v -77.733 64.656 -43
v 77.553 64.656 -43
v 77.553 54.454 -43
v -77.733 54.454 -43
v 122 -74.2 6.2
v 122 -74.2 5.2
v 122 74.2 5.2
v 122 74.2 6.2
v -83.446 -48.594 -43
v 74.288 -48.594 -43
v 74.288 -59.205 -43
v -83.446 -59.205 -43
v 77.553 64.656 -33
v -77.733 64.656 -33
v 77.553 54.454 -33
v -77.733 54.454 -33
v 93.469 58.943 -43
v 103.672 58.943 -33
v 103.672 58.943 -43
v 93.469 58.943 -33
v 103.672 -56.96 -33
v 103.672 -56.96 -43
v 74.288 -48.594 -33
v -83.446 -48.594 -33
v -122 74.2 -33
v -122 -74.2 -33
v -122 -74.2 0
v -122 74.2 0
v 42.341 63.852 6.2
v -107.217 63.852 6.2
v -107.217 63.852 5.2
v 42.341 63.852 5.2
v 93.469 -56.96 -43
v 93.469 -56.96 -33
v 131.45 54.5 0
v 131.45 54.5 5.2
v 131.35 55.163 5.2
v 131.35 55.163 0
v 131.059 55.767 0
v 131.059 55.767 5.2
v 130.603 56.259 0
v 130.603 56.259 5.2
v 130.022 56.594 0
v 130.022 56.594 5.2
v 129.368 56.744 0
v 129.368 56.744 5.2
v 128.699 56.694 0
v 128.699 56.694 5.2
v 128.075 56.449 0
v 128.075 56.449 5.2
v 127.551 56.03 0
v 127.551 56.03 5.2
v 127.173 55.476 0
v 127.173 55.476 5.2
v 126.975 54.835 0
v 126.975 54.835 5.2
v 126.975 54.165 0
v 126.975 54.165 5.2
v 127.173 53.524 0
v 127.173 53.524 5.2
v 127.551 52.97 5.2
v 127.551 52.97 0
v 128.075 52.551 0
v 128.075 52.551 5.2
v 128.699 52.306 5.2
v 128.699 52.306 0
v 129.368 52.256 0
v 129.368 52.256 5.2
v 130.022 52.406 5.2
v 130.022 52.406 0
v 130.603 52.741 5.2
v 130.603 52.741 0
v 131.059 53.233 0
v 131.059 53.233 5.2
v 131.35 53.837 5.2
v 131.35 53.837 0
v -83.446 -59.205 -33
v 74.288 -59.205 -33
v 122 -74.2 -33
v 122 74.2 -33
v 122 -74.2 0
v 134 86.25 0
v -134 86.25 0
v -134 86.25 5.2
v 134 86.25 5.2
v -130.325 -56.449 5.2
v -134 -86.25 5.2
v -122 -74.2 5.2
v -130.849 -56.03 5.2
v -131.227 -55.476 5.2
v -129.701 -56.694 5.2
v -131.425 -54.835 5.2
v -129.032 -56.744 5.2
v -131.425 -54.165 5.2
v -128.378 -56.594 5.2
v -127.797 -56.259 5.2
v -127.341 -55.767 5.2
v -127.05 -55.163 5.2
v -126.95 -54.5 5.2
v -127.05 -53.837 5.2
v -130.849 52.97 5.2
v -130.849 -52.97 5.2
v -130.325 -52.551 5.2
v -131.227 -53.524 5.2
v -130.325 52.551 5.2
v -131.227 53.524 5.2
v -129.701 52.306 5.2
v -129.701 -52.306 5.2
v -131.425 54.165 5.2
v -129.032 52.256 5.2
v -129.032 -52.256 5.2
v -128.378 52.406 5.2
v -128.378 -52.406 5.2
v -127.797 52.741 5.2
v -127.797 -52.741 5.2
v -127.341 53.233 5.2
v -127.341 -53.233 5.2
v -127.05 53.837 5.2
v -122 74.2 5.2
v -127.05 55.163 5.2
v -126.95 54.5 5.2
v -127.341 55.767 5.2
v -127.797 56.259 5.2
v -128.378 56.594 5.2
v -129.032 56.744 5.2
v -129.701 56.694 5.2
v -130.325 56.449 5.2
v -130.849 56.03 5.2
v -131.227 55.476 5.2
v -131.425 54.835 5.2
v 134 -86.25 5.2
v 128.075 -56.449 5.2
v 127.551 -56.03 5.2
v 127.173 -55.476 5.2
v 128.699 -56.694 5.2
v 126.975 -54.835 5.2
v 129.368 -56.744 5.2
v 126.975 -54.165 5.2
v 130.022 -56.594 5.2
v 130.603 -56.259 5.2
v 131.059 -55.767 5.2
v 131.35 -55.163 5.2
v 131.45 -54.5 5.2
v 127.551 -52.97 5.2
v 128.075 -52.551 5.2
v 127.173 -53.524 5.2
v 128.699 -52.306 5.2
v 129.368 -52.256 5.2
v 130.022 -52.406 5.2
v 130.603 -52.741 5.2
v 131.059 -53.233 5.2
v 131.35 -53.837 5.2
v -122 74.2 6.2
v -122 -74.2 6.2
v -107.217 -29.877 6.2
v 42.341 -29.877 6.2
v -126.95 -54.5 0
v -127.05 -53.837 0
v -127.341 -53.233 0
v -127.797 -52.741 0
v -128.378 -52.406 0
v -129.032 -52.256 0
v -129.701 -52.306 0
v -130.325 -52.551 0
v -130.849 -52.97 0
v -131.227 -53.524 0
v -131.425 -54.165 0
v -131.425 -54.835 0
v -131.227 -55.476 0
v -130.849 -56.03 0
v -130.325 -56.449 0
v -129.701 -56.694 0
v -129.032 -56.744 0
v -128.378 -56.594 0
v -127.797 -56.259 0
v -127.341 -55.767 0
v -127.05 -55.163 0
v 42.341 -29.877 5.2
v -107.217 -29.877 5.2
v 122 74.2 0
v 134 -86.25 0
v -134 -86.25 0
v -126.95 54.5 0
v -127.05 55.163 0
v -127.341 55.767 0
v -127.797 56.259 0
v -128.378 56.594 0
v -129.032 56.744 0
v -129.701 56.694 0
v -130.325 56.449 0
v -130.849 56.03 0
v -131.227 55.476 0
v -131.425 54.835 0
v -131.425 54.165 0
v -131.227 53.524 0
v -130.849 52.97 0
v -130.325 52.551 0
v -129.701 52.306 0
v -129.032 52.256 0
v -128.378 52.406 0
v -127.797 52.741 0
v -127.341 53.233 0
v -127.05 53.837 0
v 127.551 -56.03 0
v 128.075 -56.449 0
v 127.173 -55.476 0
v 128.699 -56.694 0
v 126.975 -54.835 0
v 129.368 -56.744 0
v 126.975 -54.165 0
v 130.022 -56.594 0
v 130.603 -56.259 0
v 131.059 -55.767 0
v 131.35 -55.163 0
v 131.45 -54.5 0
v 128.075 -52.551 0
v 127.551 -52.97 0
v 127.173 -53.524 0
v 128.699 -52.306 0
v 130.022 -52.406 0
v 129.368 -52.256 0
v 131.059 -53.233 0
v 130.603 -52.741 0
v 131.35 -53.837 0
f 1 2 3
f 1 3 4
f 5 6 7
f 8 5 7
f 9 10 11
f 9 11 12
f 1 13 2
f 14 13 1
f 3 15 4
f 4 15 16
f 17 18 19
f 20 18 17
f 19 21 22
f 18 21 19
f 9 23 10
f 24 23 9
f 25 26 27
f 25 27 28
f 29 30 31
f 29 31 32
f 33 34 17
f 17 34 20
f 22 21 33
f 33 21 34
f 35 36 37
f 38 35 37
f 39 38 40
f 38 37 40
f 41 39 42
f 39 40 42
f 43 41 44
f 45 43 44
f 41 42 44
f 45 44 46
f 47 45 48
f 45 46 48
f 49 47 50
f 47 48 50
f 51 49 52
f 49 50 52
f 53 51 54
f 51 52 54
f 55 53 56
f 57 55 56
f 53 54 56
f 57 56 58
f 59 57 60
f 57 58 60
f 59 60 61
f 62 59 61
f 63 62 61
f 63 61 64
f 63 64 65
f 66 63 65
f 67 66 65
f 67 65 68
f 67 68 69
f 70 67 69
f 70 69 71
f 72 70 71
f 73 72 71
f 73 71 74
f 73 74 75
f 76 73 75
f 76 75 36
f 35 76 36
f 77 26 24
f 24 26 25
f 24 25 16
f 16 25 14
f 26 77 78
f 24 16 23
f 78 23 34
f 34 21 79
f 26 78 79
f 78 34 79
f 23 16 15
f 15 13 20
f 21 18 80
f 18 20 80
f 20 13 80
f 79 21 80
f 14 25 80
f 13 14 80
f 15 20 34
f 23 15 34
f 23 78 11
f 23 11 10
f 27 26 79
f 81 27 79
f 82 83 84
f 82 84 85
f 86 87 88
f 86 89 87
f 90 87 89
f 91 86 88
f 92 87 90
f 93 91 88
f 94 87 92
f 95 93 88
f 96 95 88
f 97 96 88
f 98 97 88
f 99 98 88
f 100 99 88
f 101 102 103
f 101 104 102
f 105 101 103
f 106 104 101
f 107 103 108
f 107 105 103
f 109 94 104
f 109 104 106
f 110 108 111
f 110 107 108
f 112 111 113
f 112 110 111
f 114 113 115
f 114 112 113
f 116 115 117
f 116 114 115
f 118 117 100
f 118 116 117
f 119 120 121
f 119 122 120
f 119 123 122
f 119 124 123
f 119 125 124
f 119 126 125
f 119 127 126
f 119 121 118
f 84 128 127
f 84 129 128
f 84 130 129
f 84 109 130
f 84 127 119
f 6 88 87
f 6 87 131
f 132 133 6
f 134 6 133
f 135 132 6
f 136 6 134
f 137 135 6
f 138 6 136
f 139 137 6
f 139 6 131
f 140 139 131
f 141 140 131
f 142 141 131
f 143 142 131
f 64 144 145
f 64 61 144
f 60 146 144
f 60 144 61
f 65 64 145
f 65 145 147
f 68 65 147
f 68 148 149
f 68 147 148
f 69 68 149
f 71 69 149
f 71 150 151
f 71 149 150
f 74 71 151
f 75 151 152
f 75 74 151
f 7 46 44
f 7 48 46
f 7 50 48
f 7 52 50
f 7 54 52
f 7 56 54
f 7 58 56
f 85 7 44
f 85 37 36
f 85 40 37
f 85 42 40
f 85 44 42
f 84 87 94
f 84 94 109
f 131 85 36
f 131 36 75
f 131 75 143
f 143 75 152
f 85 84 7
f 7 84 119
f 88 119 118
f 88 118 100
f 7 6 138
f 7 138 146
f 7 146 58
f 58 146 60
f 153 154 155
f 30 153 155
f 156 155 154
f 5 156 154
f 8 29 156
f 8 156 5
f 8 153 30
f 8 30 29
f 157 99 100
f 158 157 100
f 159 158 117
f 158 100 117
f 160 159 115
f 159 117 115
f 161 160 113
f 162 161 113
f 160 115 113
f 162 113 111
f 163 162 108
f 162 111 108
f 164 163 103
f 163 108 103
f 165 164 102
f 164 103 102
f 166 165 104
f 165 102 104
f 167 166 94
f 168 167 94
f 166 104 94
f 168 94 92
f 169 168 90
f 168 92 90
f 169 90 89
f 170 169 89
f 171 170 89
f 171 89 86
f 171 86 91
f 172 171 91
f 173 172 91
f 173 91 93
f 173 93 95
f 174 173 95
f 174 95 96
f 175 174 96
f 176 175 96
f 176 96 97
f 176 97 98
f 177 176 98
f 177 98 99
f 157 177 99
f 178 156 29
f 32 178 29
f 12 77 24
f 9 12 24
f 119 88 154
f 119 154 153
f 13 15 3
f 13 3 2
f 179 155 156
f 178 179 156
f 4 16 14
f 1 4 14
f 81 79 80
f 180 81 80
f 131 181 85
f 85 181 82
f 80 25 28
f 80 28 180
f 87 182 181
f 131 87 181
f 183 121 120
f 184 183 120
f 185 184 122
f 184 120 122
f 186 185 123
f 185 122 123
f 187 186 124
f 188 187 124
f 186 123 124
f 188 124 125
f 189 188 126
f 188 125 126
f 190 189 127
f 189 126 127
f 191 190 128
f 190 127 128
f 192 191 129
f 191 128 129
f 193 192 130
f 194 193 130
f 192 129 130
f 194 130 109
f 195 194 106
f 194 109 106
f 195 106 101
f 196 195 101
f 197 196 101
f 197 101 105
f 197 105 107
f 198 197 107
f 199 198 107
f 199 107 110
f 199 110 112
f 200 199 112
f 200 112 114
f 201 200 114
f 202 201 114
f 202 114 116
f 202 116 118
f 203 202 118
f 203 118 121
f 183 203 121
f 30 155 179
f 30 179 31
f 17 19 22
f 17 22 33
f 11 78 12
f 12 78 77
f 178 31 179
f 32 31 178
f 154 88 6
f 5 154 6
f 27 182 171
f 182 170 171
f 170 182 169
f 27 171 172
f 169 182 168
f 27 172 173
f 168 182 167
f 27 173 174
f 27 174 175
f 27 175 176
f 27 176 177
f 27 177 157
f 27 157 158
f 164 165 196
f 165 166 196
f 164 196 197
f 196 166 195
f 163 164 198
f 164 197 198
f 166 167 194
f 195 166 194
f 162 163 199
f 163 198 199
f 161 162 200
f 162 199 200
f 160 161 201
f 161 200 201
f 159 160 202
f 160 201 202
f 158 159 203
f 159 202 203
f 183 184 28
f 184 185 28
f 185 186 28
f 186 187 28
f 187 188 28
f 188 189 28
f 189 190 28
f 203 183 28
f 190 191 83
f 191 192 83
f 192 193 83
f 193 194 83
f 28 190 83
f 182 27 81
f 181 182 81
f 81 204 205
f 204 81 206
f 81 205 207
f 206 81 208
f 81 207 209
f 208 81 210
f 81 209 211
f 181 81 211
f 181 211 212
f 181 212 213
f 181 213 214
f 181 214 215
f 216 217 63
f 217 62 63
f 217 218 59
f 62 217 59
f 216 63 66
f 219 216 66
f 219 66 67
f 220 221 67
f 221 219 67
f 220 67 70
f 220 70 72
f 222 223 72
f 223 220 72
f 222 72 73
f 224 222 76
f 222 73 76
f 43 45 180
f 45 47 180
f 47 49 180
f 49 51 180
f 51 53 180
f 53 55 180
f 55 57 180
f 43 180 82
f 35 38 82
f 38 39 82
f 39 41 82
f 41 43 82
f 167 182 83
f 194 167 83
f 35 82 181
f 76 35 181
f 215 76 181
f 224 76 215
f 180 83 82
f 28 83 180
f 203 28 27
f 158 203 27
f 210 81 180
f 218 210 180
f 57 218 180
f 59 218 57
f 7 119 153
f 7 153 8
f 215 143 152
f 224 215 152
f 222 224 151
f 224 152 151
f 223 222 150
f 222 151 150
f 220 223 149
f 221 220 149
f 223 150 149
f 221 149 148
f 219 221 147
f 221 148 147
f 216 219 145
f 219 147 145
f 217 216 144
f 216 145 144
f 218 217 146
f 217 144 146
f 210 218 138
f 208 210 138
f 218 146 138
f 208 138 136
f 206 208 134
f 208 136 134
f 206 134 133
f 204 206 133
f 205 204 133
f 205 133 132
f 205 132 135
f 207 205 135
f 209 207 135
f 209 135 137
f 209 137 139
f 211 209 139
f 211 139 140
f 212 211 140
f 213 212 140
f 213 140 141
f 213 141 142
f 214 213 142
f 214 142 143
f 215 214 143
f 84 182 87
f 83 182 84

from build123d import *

# Parameters (mm, degrees)
SKETCH2_W                = 268
SKETCH2_H                = 172.5
BOSS_EXTRUDE2_DEPTH      = 5.2
BOSS_EXTRUDE1_DEPTH      = 6.2
BOSS_EXTRUDE1_DEPTH_BACK = 33
SKETCH1_W                = 244
SKETCH1_H                = 148.4
M4_CLEARANCE_HOLE1_D     = 4.5
SKETCH6_W                = 149.557953786
SKETCH6_H                = 93.729813504
CUT_EXTRUDE1_DEPTH       = 1
SKETCH7_W                = 10.202720683
SKETCH7_H                = 115.902906959
SKETCH7_W_2              = 155.285408795
SKETCH7_H_2              = 10.202720683
SKETCH7_W_3              = 157.734061759
SKETCH7_H_3              = 10.61082951
BOSS_EXTRUDE3_DEPTH      = 10


with BuildPart() as part:
    # Sketch2 → Boss-Extrude2 (new body)
    with BuildSketch(Plane.XY):
        Rectangle(SKETCH2_W, SKETCH2_H)
    extrude(amount=BOSS_EXTRUDE2_DEPTH)

    # Sketch1 → Boss-Extrude1 (add, two sides: drawn at the far end of the back side and taken through both)
    with BuildSketch(Plane.XY.offset(-BOSS_EXTRUDE1_DEPTH_BACK)):
        Rectangle(SKETCH1_W, SKETCH1_H)
    extrude(amount=BOSS_EXTRUDE1_DEPTH + BOSS_EXTRUDE1_DEPTH_BACK)

    # M4 Clearance Hole1 (through all)
    with Locations(Plane(origin=(0, 0, 0), x_dir=(-1, 0, 0), z_dir=(0, 0, -1))):
        with Locations((-129.2, 54.5), (129.2, -54.5), (129.2, 54.5), (-129.2, -54.5)):
            Hole(M4_CLEARANCE_HOLE1_D / 2)

    # Sketch6 → Cut-Extrude1 (cut)
    with BuildSketch(Plane.XY.offset(6.2)):
        with Locations((-32.438368972, 16.987461646)):
            Rectangle(SKETCH6_W, SKETCH6_H)
    extrude(amount=-CUT_EXTRUDE1_DEPTH, mode=Mode.SUBTRACT)

    # Sketch7 → Boss-Extrude3 (add)
    with BuildSketch(Plane(origin=(0, 0, -33), x_dir=(-1, 0, 0), z_dir=(0, 0, -1))):
        with Locations((-98.57020546, 0.991507772)):
            Rectangle(SKETCH7_W, SKETCH7_H)
        with Locations((0.090103545, 59.555124492)):
            Rectangle(SKETCH7_W_2, SKETCH7_H_2)
        with Locations((4.579300645, -53.899129503)):
            Rectangle(SKETCH7_W_3, SKETCH7_H_3)
    extrude(amount=BOSS_EXTRUDE3_DEPTH)


solid = part.part
